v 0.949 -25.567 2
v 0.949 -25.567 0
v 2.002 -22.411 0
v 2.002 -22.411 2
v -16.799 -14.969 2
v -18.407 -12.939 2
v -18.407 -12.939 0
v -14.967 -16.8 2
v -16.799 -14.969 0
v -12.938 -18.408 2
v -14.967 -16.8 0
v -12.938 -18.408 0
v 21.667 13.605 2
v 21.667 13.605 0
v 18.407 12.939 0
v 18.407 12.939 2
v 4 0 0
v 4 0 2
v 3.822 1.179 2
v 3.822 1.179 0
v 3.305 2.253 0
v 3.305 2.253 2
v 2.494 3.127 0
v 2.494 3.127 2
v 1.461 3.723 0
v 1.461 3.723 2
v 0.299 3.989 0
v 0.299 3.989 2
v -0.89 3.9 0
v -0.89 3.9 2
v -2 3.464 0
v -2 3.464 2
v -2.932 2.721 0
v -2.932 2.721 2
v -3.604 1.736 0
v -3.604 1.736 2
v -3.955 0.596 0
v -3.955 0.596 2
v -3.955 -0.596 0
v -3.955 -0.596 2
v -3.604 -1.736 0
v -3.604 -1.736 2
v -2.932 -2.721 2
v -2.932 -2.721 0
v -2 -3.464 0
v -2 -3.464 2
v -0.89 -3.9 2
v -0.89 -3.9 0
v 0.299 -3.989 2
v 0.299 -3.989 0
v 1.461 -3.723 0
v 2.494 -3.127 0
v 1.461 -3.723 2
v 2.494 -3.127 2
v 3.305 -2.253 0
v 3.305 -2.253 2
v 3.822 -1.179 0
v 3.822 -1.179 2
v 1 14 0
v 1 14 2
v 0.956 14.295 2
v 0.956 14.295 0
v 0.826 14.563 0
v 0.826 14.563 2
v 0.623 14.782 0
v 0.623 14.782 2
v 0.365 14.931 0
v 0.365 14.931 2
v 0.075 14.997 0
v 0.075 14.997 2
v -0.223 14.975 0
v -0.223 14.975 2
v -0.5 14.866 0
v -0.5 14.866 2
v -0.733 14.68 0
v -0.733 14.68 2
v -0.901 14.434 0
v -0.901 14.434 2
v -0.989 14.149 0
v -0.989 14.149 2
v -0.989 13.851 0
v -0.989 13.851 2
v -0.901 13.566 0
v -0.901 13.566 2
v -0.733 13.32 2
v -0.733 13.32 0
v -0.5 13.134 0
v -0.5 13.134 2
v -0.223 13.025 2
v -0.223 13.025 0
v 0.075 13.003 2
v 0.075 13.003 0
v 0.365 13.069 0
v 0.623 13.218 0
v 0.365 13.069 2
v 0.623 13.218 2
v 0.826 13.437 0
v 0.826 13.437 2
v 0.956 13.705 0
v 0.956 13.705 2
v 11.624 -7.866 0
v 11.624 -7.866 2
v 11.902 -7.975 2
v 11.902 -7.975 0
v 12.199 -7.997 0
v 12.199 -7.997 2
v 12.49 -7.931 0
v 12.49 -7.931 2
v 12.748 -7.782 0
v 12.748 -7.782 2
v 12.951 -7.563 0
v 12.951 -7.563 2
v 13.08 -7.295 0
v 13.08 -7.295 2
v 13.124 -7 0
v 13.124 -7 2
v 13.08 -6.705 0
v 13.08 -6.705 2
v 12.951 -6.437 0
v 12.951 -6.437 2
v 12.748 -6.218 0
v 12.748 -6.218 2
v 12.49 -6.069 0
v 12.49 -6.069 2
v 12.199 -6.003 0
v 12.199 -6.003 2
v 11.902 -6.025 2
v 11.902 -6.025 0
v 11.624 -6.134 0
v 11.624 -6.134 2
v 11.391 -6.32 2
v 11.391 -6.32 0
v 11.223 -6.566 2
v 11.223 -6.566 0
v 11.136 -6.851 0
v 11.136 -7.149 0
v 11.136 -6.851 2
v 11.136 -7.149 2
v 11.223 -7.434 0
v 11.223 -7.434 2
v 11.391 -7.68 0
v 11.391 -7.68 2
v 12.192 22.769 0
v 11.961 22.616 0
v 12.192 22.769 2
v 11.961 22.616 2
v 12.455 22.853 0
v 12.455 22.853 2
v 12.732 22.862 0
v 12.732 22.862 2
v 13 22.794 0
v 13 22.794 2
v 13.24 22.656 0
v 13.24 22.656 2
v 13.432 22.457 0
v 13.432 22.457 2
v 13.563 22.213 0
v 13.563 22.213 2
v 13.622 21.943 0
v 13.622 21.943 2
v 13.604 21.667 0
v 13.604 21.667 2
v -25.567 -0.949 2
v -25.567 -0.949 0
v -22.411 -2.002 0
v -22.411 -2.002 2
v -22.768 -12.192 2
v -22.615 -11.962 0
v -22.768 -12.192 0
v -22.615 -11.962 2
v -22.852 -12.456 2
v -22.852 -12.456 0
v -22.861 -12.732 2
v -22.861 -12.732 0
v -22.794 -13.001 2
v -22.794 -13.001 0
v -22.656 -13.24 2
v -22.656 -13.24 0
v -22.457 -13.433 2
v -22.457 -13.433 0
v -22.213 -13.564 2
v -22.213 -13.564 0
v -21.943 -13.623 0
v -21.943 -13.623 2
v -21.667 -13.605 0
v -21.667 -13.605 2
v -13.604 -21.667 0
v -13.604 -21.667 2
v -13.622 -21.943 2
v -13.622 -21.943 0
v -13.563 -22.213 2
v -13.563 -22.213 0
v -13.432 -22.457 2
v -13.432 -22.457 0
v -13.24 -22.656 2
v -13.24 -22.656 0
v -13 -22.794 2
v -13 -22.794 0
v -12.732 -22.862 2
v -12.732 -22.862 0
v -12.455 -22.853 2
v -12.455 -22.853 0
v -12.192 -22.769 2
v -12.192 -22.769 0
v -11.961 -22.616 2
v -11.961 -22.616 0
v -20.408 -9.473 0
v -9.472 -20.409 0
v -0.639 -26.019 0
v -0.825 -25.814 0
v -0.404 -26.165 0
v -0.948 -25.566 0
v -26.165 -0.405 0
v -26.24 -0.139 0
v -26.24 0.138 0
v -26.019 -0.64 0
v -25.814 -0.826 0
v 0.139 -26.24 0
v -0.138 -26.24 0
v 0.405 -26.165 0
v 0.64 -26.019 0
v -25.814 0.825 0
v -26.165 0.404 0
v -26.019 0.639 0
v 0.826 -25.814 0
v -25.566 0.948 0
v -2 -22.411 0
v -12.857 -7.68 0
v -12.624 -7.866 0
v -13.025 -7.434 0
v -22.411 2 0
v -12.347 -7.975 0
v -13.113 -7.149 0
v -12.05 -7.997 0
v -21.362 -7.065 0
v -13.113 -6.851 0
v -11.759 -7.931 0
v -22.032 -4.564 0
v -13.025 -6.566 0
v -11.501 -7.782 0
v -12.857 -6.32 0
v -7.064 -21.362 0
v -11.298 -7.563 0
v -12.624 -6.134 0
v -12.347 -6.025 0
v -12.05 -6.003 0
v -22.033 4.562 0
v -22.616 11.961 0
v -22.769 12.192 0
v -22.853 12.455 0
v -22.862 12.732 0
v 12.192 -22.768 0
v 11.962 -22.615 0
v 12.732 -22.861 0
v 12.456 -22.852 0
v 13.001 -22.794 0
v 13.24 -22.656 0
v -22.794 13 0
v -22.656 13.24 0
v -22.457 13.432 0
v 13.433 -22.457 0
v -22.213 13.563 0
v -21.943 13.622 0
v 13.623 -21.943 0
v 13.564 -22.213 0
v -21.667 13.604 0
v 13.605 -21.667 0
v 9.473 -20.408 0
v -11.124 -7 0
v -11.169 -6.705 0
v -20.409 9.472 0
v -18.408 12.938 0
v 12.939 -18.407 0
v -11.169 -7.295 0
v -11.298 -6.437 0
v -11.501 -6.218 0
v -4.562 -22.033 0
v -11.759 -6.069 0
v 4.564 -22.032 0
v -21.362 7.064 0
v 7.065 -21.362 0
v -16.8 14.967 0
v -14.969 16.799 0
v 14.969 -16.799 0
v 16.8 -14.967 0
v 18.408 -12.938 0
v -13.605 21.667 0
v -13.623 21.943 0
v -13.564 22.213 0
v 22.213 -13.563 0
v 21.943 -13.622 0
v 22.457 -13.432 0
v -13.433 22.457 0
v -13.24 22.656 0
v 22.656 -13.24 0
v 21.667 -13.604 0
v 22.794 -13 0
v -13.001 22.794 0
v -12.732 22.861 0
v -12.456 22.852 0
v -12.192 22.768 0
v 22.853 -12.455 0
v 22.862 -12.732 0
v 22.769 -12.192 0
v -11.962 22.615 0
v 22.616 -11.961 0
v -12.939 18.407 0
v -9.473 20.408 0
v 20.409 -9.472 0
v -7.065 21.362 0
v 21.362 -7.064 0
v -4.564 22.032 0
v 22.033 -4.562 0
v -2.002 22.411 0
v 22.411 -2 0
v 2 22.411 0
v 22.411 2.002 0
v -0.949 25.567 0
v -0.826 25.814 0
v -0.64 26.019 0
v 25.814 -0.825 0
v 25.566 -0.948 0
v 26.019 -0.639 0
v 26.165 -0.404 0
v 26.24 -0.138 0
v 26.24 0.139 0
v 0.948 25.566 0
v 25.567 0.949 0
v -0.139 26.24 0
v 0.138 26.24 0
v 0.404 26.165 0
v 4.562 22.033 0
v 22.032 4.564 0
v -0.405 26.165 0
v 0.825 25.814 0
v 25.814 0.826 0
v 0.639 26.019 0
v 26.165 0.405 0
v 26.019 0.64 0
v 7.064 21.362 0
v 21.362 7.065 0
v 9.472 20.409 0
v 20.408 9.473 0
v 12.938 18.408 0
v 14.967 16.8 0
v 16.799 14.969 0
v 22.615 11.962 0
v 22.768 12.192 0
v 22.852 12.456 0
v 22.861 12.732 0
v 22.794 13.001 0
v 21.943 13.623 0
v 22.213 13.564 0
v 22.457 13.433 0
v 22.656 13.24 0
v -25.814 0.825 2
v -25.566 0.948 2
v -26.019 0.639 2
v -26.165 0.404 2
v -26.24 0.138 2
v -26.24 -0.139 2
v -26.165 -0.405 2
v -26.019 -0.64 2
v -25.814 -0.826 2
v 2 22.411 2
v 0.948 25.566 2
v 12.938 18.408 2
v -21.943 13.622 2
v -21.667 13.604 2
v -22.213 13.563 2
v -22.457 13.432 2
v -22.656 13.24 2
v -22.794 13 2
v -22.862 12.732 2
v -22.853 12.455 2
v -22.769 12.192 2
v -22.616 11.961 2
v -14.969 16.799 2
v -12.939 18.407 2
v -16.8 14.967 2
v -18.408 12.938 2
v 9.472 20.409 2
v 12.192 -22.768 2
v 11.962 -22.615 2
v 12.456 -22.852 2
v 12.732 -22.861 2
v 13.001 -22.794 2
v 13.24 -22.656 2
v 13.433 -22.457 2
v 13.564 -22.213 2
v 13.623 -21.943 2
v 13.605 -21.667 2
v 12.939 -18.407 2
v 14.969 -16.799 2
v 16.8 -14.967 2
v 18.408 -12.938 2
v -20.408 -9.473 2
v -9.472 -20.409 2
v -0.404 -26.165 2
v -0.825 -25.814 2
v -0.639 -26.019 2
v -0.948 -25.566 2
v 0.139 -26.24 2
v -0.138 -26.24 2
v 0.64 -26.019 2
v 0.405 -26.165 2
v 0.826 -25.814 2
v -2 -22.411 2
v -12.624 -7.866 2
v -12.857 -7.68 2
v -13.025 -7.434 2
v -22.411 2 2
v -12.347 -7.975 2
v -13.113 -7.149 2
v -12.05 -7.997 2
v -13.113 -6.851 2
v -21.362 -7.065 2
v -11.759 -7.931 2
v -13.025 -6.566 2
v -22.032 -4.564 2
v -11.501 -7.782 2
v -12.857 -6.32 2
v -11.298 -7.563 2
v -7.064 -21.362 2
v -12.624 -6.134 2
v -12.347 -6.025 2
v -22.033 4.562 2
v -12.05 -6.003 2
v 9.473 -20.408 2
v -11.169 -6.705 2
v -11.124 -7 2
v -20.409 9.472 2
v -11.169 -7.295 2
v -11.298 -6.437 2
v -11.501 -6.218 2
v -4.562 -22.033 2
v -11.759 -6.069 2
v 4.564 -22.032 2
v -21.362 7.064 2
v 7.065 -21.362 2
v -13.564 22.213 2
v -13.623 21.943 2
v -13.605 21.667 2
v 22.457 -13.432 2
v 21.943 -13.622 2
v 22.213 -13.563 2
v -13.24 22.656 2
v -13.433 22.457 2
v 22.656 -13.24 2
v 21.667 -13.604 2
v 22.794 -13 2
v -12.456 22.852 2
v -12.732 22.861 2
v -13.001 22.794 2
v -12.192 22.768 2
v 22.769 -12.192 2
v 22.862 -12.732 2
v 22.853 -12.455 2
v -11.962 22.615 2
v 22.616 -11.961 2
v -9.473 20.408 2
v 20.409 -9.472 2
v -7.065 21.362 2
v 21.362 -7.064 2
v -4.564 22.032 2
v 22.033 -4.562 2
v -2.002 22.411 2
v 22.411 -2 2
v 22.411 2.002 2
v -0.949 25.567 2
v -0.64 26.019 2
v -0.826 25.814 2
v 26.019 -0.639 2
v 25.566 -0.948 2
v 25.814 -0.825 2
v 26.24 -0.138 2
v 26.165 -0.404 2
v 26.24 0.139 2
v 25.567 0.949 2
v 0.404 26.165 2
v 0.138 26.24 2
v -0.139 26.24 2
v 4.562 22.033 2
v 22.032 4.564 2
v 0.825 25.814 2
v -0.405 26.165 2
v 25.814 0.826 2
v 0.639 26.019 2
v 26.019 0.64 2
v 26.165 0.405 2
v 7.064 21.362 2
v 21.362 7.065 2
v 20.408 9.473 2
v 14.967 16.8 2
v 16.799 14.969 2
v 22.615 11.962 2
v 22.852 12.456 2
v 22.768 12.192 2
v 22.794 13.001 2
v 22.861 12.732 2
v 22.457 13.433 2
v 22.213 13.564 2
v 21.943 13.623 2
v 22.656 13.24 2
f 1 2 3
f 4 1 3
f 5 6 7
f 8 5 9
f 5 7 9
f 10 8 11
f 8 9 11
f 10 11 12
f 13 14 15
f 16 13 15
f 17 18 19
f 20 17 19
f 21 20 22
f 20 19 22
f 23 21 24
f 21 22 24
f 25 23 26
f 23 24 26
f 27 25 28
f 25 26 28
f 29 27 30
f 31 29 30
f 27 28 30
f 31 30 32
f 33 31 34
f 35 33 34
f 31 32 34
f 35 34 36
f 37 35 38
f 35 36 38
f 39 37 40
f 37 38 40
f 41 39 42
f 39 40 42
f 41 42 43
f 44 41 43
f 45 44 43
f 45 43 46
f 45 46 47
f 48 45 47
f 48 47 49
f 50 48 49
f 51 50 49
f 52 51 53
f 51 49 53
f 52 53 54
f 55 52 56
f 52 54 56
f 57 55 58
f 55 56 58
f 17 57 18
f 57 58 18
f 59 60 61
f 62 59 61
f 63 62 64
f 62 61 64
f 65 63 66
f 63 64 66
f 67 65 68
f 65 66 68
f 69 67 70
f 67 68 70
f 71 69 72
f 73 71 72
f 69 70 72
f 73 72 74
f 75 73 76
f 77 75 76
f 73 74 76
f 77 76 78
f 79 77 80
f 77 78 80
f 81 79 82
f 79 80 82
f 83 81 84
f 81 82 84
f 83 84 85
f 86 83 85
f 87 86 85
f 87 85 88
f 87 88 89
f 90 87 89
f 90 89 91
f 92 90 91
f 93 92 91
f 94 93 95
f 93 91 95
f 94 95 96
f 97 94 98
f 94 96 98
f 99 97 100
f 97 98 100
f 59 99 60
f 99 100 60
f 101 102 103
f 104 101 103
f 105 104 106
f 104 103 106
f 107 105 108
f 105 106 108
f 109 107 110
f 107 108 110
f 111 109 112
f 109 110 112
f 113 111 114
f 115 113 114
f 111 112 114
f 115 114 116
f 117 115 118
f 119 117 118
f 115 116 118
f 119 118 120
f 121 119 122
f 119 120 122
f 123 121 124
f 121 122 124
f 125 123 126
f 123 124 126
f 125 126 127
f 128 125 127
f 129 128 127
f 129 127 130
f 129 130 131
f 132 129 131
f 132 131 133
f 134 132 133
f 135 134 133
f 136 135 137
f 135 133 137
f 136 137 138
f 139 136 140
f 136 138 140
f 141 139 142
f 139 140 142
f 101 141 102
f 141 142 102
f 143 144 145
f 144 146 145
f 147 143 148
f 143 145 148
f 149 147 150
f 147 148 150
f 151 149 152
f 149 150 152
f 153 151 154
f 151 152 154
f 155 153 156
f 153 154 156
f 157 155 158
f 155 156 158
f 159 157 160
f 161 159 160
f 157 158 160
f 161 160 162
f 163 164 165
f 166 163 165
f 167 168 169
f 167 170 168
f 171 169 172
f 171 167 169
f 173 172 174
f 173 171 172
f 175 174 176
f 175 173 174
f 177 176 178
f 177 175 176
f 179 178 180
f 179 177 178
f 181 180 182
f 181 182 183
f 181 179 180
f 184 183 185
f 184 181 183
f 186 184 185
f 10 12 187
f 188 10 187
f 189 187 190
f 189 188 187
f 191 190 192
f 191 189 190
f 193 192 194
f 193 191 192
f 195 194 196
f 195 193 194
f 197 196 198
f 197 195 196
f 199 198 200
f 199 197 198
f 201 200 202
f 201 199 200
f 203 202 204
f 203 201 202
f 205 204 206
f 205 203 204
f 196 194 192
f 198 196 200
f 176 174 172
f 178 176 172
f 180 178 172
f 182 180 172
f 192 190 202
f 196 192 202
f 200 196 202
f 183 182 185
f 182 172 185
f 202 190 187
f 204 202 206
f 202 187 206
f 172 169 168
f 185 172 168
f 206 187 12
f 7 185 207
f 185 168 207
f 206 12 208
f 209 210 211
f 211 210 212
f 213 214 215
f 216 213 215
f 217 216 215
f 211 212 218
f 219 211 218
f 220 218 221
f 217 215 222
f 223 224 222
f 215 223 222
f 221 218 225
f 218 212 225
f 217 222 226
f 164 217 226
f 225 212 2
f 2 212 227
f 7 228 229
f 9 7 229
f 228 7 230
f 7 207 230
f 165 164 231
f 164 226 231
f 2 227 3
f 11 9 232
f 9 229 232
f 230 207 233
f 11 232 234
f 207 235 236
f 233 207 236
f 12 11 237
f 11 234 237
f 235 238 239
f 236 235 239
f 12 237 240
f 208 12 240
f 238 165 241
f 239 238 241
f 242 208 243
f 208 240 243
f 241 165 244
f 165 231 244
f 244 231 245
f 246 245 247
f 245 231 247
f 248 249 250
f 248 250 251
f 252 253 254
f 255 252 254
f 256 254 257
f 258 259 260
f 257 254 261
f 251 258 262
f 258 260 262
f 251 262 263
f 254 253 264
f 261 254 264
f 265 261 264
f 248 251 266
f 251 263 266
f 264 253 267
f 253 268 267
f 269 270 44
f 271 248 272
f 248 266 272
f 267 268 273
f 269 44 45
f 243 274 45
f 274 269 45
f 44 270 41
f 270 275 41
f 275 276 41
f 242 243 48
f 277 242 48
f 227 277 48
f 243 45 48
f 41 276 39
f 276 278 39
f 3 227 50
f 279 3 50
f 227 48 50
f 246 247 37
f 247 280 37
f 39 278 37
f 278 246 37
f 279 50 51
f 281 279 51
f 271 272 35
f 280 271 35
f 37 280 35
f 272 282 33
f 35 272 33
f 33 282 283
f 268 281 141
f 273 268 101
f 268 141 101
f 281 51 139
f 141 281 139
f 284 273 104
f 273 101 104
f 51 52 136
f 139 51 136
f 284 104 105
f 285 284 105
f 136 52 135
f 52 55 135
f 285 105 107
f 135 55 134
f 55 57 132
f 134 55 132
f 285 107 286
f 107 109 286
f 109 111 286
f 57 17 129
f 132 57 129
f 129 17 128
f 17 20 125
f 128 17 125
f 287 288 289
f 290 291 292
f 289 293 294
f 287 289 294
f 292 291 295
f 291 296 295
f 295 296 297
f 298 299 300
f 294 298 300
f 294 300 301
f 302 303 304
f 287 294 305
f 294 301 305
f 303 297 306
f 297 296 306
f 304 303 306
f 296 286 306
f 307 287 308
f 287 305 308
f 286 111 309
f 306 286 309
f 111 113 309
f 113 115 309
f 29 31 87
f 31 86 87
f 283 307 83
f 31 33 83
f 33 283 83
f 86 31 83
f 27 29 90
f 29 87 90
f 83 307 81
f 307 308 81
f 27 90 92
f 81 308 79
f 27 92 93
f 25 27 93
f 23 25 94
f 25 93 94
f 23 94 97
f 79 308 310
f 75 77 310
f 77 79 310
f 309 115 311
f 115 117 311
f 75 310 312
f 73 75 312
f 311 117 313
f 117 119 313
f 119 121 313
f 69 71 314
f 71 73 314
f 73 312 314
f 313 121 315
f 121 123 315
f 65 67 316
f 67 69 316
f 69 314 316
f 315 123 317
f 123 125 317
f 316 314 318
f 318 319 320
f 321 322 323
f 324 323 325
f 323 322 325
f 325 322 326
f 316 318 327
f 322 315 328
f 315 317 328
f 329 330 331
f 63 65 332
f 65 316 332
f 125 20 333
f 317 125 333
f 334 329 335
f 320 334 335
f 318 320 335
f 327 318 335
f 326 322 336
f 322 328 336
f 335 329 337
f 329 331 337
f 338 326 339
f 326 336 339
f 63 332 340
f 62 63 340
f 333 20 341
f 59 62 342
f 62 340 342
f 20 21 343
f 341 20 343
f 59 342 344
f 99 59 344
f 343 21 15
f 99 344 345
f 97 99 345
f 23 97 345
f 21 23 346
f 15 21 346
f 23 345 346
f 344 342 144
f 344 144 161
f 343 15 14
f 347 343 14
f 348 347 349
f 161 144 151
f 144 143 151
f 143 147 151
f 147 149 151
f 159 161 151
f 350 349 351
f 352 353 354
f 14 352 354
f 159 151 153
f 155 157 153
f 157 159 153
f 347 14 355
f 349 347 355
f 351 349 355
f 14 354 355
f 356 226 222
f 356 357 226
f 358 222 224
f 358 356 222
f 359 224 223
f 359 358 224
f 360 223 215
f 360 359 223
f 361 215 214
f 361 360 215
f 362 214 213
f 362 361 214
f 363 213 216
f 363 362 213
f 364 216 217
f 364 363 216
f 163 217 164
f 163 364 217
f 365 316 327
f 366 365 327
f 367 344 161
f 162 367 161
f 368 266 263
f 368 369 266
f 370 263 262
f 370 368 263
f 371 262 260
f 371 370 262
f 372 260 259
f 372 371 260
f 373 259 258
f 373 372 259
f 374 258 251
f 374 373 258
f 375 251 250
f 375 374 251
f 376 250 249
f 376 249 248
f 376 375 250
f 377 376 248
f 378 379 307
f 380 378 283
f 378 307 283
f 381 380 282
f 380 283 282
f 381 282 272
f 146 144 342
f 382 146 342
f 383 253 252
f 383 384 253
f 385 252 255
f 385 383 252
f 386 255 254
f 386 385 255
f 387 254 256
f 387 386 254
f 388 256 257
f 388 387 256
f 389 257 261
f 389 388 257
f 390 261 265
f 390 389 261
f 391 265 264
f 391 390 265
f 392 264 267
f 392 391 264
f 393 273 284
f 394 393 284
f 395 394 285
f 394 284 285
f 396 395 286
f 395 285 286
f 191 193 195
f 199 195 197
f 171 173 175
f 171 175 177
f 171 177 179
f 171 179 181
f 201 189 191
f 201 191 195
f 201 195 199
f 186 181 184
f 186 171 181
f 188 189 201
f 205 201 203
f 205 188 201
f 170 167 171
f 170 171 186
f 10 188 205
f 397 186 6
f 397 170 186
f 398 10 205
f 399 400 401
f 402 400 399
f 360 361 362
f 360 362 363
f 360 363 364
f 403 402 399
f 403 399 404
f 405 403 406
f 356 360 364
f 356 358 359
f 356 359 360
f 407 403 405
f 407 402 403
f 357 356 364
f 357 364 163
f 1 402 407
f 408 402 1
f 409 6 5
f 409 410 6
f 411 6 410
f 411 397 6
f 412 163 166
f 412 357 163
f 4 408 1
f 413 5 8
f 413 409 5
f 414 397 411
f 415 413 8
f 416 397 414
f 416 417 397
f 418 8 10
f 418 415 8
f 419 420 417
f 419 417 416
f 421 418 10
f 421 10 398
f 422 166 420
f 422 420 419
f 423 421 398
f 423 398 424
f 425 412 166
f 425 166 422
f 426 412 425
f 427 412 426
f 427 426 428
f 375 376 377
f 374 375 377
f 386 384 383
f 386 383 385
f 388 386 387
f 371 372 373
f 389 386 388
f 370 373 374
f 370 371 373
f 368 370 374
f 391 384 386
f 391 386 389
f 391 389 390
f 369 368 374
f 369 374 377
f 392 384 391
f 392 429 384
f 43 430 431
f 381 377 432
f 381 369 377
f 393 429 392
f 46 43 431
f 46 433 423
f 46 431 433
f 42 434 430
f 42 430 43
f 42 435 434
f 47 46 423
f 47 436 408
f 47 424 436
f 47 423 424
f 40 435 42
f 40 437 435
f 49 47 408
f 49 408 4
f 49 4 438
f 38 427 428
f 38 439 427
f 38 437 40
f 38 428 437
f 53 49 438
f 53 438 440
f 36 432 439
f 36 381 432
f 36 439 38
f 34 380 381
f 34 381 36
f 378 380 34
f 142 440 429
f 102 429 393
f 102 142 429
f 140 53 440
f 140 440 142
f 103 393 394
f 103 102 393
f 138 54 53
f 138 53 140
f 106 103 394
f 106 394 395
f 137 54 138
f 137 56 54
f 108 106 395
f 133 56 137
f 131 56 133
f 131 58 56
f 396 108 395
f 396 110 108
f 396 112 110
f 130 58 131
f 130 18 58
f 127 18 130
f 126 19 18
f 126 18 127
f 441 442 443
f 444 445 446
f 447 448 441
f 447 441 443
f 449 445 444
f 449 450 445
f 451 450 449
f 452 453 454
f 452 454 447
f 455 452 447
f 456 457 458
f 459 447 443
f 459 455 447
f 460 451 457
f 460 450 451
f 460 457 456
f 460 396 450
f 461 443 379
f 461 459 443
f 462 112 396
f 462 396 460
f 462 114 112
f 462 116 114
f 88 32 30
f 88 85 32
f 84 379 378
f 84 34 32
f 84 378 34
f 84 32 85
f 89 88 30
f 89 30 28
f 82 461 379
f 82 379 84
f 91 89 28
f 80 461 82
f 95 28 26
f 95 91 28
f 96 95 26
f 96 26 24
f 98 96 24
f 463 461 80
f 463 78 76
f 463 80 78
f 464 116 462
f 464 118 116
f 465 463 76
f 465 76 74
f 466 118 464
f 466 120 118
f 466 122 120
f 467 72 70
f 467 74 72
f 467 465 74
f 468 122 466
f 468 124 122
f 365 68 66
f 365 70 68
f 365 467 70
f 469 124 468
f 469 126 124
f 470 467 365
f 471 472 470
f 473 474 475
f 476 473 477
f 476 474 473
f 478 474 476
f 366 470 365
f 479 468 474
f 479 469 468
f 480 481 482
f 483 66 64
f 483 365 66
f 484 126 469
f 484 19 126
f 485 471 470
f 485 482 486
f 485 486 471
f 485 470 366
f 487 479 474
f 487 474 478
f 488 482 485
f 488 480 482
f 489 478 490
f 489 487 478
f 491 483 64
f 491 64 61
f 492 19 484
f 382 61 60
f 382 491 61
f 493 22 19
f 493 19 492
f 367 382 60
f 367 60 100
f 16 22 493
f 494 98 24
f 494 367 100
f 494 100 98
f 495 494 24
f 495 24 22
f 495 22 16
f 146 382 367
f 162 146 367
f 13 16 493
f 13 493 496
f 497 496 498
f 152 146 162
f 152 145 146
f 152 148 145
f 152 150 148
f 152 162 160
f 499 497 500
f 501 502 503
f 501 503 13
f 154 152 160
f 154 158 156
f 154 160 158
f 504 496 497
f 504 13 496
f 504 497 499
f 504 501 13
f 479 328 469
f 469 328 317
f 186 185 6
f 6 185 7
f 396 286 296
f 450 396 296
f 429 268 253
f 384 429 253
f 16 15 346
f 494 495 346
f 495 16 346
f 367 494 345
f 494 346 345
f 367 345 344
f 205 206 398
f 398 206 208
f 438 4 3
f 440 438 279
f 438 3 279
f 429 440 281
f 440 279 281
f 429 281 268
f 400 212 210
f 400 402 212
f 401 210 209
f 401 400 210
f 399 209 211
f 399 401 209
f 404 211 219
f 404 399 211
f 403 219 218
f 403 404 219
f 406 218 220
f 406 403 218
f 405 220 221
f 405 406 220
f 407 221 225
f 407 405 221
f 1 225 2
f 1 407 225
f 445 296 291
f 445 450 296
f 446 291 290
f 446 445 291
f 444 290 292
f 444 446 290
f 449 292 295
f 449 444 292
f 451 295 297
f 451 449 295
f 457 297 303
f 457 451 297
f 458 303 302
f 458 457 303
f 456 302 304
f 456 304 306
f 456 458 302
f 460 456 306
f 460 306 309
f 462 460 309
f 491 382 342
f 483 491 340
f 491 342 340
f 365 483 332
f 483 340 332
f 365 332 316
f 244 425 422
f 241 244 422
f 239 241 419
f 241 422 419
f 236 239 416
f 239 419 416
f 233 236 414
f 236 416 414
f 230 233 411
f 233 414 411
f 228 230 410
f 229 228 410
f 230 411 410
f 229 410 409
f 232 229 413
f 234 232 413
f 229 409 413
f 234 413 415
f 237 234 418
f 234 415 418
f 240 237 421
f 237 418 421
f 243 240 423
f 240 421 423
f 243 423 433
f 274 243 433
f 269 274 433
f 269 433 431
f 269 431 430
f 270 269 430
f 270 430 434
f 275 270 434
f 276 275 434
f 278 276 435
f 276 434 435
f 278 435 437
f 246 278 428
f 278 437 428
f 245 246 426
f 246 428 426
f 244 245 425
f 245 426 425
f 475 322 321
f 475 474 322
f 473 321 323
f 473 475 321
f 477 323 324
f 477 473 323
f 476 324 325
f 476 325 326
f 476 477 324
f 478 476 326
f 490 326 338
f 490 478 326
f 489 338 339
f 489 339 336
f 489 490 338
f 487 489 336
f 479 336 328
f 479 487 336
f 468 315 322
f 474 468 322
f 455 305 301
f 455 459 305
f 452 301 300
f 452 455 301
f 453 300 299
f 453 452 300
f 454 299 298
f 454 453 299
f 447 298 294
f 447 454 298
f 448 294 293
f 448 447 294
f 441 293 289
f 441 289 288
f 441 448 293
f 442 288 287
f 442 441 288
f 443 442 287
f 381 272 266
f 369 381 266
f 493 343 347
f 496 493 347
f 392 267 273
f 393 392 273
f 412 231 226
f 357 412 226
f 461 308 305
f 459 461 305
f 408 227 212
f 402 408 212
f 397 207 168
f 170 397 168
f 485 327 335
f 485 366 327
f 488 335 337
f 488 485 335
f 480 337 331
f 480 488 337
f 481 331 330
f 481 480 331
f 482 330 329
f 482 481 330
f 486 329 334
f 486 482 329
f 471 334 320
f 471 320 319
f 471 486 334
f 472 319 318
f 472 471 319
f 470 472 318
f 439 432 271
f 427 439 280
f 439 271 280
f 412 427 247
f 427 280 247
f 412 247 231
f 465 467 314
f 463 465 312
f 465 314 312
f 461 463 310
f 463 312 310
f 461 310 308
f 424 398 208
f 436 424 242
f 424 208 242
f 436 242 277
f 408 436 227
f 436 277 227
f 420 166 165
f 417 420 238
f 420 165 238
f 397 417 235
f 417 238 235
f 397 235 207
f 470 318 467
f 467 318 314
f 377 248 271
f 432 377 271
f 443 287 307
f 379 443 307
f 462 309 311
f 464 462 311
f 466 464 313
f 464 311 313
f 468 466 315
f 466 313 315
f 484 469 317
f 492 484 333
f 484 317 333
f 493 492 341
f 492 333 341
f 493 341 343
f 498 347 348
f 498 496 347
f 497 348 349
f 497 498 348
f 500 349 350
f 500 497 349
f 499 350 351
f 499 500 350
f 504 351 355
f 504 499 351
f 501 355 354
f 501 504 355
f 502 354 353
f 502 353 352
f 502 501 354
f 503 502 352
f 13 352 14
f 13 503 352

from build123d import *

# Parameters (mm, degrees)
SKETCH_1_R                       = 22.5
EXTRUDE_1_DEPTH                  = 2
EXTRUDE_2_DEPTH                  = 2
FILLET_1_R                       = 1
PATTERN_CIRCULAR_1_COUNT         = 12
FILLET_1_OF_PATTERN_CIRCULAR_1_R = 1
SKETCH_3_R                       = 4
CUT_EXTRUDE_1_DEPTH              = 2
SKETCH_4_R                       = 1
CUT_EXTRUDE_2_DEPTH              = 2
PATTERN_CIRCULAR_2_COUNT         = 3


with BuildPart() as part:
    # 草图1 → 凸台-拉伸1 (new body)
    with BuildSketch(Plane.XY):
        Circle(SKETCH_1_R)
    extrude(amount=EXTRUDE_1_DEPTH)

    # 草图2 → 凸台-拉伸2 (add)
    with BuildSketch(Plane.XY):
        with BuildLine():
            Line((0, 28.410934831), (-2.001953781, 22.410760386))
            ThreePointArc((-2.001953781, 22.410760386), (-0.000980777, 22.499999979), (2, 22.410934831))
            Line((2, 22.410934831), (0, 28.410934831))
        make_face()
    extrude_2 = extrude(amount=EXTRUDE_2_DEPTH)

    # 圆角1
    fillet_1_edges = [part.edges().sort_by_distance(p)[0] for p in [
        (0, 28.410934831, 1),
    ]]
    fillet(fillet_1_edges, radius=FILLET_1_R)

    # 阵列(圆周)1: 凸台-拉伸2 ×12 about axis
    pattern_circular_1_axis = Axis((0, 0, 0), (0, 0, 1))
    for i in range(1, PATTERN_CIRCULAR_1_COUNT):
        add(extrude_2.rotate(pattern_circular_1_axis, i * 360 / PATTERN_CIRCULAR_1_COUNT))

    # 圆角1 of 阵列(圆周)1
    fillet_1_of_pattern_circular_1_edges = [part.edges().sort_by_distance(p)[0] for p in [
        (-14.205467416, 24.604591309, 1),
        (-24.604591309, 14.205467416, 1),
        (-28.410934831, 0, 1),
        (-24.604591309, -14.205467416, 1),
        (-14.205467416, -24.604591309, 1),
        (0, -28.410934831, 1),
        (14.205467416, -24.604591309, 1),
        (24.604591309, -14.205467416, 1),
        (28.410934831, 0, 1),
        (24.604591309, 14.205467416, 1),
        (14.205467416, 24.604591309, 1),
    ]]
    fillet(fillet_1_of_pattern_circular_1_edges, radius=FILLET_1_OF_PATTERN_CIRCULAR_1_R)

    # 草图3 → 切除-拉伸1 (cut)
    with BuildSketch(Plane.XY.offset(2)):
        Circle(SKETCH_3_R)
    extrude(amount=-CUT_EXTRUDE_1_DEPTH, mode=Mode.SUBTRACT)

    # 草图4 → 切除-拉伸2 (cut)
    with BuildSketch(Plane.XY.offset(2)):
        with Locations((0, 14)):
            Circle(SKETCH_4_R)
    cut_extrude_2 = extrude(amount=-CUT_EXTRUDE_2_DEPTH, mode=Mode.SUBTRACT)

    # 阵列(圆周)2: 切除-拉伸2 ×3 about axis
    pattern_circular_2_axis = Axis((0, 0, 0), (0, 0, 1))
    for i in range(1, PATTERN_CIRCULAR_2_COUNT):
        add(cut_extrude_2.rotate(pattern_circular_2_axis, i * 360 / PATTERN_CIRCULAR_2_COUNT), mode=Mode.SUBTRACT)


solid = part.part
